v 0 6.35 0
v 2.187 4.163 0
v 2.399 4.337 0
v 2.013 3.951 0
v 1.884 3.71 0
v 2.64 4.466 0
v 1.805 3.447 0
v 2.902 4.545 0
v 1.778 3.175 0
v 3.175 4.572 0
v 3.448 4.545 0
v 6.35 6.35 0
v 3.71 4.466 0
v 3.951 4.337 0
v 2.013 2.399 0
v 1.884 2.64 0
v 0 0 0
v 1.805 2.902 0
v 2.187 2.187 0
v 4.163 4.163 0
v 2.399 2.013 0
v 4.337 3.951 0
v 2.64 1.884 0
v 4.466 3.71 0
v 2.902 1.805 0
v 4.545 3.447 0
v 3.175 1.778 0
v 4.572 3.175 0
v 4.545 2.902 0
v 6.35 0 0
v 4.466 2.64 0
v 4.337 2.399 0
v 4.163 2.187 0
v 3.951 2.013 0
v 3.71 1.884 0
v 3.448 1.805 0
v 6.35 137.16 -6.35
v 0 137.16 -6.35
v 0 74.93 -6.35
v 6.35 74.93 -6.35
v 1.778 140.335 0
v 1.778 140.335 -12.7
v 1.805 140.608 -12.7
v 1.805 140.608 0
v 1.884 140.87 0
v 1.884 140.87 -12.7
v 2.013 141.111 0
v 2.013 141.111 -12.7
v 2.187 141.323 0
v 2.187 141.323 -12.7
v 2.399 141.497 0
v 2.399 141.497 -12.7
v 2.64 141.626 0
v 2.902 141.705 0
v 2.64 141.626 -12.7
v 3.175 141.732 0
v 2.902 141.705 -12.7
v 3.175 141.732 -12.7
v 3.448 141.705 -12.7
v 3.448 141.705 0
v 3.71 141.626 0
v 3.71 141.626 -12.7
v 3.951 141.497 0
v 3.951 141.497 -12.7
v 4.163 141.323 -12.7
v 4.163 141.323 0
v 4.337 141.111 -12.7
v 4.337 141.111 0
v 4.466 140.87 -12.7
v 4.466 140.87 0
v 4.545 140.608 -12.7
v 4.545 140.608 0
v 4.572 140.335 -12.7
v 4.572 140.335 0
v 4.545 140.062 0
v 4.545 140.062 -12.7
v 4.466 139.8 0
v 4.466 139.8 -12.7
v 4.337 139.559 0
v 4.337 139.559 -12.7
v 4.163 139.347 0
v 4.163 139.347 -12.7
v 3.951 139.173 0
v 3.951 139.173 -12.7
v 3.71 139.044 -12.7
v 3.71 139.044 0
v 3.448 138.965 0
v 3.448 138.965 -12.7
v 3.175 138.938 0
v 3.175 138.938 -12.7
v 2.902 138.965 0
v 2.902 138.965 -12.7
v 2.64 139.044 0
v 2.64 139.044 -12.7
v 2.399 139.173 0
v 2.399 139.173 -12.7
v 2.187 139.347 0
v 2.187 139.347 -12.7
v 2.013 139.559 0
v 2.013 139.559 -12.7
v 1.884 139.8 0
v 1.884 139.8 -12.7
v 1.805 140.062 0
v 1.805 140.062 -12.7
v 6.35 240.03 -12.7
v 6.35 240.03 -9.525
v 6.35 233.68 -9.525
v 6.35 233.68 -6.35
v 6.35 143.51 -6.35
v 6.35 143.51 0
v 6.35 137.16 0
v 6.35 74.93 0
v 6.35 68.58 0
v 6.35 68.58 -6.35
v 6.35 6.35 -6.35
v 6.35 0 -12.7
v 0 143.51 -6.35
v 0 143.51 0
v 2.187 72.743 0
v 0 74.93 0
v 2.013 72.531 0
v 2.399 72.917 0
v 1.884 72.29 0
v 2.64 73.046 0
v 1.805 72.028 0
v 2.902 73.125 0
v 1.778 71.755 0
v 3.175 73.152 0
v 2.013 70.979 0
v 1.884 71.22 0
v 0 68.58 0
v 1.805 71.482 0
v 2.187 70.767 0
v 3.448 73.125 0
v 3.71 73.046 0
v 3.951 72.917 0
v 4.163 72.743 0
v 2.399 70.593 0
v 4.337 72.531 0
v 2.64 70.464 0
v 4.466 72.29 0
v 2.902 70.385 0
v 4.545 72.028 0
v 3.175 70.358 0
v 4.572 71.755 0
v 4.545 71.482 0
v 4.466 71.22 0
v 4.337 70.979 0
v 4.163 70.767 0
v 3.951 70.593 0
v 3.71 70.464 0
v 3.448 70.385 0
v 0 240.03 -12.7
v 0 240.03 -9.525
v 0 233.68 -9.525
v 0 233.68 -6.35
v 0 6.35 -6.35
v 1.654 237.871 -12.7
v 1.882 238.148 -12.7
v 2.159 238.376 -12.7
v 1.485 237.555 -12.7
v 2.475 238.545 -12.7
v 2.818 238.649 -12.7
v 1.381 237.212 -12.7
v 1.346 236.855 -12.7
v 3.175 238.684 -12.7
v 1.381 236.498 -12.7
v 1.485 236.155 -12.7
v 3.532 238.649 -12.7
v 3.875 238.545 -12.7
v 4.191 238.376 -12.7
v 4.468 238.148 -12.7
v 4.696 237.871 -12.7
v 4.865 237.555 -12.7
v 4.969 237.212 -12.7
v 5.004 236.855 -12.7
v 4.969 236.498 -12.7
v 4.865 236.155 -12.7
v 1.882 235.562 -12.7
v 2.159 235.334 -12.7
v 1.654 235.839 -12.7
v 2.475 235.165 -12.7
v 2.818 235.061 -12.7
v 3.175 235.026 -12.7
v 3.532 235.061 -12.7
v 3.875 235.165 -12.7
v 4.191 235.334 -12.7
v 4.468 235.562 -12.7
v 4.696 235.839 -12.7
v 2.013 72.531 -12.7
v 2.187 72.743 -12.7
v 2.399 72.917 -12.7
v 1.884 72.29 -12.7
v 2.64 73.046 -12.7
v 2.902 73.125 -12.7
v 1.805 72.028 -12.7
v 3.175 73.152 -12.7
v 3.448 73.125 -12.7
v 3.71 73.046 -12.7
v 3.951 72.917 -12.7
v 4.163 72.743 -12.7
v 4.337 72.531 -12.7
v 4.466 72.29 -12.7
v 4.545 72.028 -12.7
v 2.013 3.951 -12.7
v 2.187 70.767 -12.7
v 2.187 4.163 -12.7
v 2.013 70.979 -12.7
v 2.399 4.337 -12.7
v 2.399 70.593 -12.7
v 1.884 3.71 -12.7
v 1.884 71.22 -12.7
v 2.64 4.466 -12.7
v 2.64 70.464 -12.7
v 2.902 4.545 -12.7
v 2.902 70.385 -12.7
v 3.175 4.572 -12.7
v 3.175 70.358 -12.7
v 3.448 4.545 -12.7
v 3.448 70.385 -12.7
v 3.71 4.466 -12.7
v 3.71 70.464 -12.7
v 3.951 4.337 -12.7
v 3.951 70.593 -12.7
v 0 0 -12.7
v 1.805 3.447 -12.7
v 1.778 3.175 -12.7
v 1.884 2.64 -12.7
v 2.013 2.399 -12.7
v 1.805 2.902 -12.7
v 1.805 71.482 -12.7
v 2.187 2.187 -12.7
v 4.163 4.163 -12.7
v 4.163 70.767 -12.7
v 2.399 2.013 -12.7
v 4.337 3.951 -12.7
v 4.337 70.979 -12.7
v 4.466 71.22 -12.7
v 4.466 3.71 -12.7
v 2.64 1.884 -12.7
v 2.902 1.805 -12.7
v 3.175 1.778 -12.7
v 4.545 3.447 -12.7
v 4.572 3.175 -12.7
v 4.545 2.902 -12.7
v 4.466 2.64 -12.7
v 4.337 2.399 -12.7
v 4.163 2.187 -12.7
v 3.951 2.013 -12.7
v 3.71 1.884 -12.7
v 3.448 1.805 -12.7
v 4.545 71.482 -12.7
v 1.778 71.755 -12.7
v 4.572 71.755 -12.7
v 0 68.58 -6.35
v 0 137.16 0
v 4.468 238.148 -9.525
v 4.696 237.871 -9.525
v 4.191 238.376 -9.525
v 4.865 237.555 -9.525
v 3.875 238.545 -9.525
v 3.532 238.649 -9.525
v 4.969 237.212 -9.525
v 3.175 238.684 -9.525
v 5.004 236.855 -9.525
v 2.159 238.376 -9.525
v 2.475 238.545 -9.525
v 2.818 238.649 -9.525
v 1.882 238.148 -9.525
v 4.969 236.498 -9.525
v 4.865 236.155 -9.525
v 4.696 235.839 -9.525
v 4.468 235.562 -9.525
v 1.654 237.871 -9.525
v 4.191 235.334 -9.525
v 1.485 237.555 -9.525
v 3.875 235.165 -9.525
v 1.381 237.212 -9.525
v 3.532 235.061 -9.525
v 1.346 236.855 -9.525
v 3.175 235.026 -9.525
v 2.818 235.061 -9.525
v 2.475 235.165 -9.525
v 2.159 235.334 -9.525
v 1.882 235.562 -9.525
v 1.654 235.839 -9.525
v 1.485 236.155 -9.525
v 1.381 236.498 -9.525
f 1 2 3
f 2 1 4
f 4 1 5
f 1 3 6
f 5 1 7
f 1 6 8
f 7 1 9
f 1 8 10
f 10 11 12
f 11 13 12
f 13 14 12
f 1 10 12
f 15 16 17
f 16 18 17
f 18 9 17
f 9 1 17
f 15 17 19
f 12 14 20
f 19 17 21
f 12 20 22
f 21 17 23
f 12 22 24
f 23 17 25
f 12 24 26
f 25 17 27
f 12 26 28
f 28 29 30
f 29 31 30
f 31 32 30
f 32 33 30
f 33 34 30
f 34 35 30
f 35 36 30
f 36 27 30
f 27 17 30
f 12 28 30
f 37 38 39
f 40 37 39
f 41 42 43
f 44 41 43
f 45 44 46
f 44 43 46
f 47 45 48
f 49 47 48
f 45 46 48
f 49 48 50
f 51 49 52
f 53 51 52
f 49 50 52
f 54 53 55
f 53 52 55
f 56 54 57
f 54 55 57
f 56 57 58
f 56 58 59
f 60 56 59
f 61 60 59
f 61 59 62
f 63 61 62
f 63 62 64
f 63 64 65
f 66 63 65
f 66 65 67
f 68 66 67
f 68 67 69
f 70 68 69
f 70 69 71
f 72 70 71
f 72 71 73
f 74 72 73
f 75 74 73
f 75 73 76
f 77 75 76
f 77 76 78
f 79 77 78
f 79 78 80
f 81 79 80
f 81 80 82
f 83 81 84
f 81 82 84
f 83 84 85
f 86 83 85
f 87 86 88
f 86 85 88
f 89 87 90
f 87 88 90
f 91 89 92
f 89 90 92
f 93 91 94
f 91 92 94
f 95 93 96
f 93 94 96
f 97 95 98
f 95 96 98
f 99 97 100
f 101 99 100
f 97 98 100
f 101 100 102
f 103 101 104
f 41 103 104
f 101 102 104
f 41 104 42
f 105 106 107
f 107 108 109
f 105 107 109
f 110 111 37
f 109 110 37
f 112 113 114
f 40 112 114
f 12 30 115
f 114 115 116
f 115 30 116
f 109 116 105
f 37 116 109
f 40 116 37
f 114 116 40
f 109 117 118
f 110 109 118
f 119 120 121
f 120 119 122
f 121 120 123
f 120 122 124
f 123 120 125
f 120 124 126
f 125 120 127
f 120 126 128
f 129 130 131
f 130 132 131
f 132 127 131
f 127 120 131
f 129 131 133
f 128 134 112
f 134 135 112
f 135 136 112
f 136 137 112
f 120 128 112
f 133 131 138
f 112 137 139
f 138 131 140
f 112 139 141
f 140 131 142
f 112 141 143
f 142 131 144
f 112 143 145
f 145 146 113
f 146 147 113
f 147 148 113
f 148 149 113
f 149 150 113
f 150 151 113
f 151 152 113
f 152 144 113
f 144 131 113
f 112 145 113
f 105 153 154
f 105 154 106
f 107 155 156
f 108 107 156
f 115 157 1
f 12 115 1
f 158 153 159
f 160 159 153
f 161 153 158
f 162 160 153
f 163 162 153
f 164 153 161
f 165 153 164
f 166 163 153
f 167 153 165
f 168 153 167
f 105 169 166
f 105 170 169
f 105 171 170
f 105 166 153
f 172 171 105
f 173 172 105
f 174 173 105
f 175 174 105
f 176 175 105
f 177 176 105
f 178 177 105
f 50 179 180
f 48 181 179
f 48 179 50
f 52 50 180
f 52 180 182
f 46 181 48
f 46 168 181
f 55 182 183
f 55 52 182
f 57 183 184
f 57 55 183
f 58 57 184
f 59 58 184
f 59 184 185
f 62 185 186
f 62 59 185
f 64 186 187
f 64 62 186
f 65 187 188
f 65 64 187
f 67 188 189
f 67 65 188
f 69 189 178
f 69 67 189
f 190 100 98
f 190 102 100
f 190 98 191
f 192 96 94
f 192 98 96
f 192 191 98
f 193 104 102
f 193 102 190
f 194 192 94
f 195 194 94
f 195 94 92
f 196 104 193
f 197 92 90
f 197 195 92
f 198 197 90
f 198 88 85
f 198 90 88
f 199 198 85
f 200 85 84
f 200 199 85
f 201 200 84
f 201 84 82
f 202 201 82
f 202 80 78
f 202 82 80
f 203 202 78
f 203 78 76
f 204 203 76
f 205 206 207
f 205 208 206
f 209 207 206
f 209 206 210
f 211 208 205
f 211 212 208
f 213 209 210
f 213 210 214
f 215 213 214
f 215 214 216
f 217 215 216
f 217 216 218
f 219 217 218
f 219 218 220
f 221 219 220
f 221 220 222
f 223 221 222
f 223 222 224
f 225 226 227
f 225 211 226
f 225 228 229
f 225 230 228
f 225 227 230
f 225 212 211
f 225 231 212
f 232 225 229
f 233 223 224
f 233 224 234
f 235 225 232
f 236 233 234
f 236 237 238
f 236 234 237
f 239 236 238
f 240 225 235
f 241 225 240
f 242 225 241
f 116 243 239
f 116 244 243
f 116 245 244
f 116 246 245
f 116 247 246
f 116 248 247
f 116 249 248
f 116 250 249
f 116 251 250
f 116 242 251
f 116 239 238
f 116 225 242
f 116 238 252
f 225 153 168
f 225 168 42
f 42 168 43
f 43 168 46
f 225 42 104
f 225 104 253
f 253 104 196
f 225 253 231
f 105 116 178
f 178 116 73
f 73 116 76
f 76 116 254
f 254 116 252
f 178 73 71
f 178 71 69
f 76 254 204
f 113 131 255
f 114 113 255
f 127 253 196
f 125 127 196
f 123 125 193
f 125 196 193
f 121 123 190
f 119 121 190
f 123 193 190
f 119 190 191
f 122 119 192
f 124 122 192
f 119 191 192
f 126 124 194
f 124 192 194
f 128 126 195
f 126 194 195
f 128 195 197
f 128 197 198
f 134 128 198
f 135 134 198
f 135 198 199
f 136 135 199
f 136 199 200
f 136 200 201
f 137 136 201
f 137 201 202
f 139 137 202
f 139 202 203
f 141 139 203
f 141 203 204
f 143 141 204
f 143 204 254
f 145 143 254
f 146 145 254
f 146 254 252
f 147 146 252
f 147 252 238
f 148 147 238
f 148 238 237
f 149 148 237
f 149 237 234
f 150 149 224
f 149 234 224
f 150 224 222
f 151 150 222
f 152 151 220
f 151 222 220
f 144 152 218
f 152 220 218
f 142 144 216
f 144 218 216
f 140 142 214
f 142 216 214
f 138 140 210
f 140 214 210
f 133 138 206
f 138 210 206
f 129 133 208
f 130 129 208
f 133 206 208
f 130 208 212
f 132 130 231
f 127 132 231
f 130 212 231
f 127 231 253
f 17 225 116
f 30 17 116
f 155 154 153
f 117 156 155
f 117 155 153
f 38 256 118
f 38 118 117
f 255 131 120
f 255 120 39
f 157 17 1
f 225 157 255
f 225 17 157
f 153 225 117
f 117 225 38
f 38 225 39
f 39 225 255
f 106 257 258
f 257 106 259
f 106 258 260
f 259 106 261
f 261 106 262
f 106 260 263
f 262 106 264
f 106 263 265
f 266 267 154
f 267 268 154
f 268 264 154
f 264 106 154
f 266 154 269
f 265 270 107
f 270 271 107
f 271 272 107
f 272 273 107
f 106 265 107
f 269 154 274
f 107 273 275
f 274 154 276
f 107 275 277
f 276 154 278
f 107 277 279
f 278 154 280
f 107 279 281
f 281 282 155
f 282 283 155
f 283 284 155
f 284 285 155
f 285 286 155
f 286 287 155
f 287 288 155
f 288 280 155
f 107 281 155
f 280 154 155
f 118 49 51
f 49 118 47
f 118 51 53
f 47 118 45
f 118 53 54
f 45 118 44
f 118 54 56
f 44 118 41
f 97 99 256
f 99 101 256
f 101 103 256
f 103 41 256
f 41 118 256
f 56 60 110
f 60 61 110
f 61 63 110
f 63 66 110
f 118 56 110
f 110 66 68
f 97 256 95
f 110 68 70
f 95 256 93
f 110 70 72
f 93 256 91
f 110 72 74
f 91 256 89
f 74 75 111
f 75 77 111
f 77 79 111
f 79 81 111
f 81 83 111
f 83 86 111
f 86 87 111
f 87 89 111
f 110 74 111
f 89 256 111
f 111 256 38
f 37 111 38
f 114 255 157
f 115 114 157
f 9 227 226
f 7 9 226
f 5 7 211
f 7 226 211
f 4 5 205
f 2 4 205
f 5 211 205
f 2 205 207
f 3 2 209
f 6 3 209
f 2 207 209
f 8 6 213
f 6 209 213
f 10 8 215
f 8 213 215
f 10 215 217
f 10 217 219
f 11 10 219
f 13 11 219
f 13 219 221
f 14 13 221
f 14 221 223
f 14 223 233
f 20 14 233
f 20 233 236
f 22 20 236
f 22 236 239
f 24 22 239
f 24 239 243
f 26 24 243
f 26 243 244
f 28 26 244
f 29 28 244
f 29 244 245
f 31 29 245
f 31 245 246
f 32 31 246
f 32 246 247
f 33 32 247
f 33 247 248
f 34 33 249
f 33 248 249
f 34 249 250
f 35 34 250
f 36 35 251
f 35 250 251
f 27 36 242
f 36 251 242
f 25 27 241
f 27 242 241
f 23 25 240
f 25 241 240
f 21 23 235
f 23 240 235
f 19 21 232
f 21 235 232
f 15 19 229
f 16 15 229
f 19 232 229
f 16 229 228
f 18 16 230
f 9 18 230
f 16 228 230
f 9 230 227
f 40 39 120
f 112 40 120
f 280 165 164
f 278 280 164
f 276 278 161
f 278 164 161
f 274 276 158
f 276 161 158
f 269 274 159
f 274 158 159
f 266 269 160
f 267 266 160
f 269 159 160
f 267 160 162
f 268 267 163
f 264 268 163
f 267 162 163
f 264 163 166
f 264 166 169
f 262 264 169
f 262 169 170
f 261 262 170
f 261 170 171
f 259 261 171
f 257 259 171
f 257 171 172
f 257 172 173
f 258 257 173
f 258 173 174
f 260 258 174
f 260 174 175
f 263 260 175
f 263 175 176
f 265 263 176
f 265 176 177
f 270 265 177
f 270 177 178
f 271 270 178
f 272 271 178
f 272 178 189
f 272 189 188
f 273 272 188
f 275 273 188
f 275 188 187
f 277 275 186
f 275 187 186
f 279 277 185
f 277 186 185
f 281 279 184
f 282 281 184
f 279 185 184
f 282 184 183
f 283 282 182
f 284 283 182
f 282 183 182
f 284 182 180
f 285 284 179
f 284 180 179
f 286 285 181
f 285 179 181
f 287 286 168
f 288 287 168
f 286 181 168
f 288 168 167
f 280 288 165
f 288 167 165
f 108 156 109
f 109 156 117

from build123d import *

# Parameters (mm, degrees)
SKETCH1_W                  = 6.35
SKETCH1_H                  = 12.7
BOSS_EXTRUDE1_DEPTH        = 240.03
CUT_EXTRUDE_THIN1_DEPTH    = 241.449606779
F_35_0_11_DIAMETER_HOLE1_D = 2.794
F_6_CLEARANCE_HOLE1_D      = 3.6576


with BuildPart() as part:
    # Sketch1 → Boss-Extrude1 (new body)
    with BuildSketch(Plane(origin=(0, 0, 0), x_dir=(1, 0, 0), z_dir=(0, 1, 0))):
        with Locations((3.175, 6.35)):
            Rectangle(SKETCH1_W, SKETCH1_H)
    extrude(amount=BOSS_EXTRUDE1_DEPTH)

    # Sketch2 → Cut-Extrude-Thin1 (cut, through all)
    with BuildSketch(Plane.ZY):
        Polygon((0, 233.68), (-9.525, 233.68), (-9.525, 240.03), (-9.52510033, 240.03), (-9.52510033, 233.67989967), (0, 233.67989967), align=None)
        Polygon((0, 143.51), (-6.35, 143.51), (-6.35, 233.68), (-6.35010033, 233.68), (-6.35010033, 143.50989967), (0, 143.50989967), align=None)
        Polygon((0, 137.16), (-6.35, 137.16), (-6.35, 74.93), (0, 74.93), (0, 74.93010033), (-6.34989967, 74.93010033), (-6.34989967, 137.15989967), (0, 137.15989967), align=None)
        Polygon((0, 68.58), (-6.35, 68.58), (-6.35, 6.35), (0, 6.35), (0, 6.35010033), (-6.34989967, 6.35010033), (-6.34989967, 68.57989967), (0, 68.57989967), align=None)
    extrude(amount=-CUT_EXTRUDE_THIN1_DEPTH, mode=Mode.SUBTRACT)


with BuildPart() as cut_extrude_thin1_kept_piece:
    # of the separate pieces the step leaves, the one the design keeps (cut_extrude_thin1_pieces_kept)
    add(part.part.solids().sort_by_distance((0, 0, 0))[0])

    # #35 (0.11) Diameter Hole1 (through all)
    with Locations(Plane.XY):
        with Locations((3.175, 140.335), (3.175, 71.755), (3.175, 3.174949835)):
            Hole(F_35_0_11_DIAMETER_HOLE1_D / 2)

    # #6 Clearance Hole1 (through all)
    with Locations(Plane.XY.offset(-9.52510033)):
        with Locations((3.175, 236.854949835)):
            Hole(F_6_CLEARANCE_HOLE1_D / 2)


solid = cut_extrude_thin1_kept_piece.part
